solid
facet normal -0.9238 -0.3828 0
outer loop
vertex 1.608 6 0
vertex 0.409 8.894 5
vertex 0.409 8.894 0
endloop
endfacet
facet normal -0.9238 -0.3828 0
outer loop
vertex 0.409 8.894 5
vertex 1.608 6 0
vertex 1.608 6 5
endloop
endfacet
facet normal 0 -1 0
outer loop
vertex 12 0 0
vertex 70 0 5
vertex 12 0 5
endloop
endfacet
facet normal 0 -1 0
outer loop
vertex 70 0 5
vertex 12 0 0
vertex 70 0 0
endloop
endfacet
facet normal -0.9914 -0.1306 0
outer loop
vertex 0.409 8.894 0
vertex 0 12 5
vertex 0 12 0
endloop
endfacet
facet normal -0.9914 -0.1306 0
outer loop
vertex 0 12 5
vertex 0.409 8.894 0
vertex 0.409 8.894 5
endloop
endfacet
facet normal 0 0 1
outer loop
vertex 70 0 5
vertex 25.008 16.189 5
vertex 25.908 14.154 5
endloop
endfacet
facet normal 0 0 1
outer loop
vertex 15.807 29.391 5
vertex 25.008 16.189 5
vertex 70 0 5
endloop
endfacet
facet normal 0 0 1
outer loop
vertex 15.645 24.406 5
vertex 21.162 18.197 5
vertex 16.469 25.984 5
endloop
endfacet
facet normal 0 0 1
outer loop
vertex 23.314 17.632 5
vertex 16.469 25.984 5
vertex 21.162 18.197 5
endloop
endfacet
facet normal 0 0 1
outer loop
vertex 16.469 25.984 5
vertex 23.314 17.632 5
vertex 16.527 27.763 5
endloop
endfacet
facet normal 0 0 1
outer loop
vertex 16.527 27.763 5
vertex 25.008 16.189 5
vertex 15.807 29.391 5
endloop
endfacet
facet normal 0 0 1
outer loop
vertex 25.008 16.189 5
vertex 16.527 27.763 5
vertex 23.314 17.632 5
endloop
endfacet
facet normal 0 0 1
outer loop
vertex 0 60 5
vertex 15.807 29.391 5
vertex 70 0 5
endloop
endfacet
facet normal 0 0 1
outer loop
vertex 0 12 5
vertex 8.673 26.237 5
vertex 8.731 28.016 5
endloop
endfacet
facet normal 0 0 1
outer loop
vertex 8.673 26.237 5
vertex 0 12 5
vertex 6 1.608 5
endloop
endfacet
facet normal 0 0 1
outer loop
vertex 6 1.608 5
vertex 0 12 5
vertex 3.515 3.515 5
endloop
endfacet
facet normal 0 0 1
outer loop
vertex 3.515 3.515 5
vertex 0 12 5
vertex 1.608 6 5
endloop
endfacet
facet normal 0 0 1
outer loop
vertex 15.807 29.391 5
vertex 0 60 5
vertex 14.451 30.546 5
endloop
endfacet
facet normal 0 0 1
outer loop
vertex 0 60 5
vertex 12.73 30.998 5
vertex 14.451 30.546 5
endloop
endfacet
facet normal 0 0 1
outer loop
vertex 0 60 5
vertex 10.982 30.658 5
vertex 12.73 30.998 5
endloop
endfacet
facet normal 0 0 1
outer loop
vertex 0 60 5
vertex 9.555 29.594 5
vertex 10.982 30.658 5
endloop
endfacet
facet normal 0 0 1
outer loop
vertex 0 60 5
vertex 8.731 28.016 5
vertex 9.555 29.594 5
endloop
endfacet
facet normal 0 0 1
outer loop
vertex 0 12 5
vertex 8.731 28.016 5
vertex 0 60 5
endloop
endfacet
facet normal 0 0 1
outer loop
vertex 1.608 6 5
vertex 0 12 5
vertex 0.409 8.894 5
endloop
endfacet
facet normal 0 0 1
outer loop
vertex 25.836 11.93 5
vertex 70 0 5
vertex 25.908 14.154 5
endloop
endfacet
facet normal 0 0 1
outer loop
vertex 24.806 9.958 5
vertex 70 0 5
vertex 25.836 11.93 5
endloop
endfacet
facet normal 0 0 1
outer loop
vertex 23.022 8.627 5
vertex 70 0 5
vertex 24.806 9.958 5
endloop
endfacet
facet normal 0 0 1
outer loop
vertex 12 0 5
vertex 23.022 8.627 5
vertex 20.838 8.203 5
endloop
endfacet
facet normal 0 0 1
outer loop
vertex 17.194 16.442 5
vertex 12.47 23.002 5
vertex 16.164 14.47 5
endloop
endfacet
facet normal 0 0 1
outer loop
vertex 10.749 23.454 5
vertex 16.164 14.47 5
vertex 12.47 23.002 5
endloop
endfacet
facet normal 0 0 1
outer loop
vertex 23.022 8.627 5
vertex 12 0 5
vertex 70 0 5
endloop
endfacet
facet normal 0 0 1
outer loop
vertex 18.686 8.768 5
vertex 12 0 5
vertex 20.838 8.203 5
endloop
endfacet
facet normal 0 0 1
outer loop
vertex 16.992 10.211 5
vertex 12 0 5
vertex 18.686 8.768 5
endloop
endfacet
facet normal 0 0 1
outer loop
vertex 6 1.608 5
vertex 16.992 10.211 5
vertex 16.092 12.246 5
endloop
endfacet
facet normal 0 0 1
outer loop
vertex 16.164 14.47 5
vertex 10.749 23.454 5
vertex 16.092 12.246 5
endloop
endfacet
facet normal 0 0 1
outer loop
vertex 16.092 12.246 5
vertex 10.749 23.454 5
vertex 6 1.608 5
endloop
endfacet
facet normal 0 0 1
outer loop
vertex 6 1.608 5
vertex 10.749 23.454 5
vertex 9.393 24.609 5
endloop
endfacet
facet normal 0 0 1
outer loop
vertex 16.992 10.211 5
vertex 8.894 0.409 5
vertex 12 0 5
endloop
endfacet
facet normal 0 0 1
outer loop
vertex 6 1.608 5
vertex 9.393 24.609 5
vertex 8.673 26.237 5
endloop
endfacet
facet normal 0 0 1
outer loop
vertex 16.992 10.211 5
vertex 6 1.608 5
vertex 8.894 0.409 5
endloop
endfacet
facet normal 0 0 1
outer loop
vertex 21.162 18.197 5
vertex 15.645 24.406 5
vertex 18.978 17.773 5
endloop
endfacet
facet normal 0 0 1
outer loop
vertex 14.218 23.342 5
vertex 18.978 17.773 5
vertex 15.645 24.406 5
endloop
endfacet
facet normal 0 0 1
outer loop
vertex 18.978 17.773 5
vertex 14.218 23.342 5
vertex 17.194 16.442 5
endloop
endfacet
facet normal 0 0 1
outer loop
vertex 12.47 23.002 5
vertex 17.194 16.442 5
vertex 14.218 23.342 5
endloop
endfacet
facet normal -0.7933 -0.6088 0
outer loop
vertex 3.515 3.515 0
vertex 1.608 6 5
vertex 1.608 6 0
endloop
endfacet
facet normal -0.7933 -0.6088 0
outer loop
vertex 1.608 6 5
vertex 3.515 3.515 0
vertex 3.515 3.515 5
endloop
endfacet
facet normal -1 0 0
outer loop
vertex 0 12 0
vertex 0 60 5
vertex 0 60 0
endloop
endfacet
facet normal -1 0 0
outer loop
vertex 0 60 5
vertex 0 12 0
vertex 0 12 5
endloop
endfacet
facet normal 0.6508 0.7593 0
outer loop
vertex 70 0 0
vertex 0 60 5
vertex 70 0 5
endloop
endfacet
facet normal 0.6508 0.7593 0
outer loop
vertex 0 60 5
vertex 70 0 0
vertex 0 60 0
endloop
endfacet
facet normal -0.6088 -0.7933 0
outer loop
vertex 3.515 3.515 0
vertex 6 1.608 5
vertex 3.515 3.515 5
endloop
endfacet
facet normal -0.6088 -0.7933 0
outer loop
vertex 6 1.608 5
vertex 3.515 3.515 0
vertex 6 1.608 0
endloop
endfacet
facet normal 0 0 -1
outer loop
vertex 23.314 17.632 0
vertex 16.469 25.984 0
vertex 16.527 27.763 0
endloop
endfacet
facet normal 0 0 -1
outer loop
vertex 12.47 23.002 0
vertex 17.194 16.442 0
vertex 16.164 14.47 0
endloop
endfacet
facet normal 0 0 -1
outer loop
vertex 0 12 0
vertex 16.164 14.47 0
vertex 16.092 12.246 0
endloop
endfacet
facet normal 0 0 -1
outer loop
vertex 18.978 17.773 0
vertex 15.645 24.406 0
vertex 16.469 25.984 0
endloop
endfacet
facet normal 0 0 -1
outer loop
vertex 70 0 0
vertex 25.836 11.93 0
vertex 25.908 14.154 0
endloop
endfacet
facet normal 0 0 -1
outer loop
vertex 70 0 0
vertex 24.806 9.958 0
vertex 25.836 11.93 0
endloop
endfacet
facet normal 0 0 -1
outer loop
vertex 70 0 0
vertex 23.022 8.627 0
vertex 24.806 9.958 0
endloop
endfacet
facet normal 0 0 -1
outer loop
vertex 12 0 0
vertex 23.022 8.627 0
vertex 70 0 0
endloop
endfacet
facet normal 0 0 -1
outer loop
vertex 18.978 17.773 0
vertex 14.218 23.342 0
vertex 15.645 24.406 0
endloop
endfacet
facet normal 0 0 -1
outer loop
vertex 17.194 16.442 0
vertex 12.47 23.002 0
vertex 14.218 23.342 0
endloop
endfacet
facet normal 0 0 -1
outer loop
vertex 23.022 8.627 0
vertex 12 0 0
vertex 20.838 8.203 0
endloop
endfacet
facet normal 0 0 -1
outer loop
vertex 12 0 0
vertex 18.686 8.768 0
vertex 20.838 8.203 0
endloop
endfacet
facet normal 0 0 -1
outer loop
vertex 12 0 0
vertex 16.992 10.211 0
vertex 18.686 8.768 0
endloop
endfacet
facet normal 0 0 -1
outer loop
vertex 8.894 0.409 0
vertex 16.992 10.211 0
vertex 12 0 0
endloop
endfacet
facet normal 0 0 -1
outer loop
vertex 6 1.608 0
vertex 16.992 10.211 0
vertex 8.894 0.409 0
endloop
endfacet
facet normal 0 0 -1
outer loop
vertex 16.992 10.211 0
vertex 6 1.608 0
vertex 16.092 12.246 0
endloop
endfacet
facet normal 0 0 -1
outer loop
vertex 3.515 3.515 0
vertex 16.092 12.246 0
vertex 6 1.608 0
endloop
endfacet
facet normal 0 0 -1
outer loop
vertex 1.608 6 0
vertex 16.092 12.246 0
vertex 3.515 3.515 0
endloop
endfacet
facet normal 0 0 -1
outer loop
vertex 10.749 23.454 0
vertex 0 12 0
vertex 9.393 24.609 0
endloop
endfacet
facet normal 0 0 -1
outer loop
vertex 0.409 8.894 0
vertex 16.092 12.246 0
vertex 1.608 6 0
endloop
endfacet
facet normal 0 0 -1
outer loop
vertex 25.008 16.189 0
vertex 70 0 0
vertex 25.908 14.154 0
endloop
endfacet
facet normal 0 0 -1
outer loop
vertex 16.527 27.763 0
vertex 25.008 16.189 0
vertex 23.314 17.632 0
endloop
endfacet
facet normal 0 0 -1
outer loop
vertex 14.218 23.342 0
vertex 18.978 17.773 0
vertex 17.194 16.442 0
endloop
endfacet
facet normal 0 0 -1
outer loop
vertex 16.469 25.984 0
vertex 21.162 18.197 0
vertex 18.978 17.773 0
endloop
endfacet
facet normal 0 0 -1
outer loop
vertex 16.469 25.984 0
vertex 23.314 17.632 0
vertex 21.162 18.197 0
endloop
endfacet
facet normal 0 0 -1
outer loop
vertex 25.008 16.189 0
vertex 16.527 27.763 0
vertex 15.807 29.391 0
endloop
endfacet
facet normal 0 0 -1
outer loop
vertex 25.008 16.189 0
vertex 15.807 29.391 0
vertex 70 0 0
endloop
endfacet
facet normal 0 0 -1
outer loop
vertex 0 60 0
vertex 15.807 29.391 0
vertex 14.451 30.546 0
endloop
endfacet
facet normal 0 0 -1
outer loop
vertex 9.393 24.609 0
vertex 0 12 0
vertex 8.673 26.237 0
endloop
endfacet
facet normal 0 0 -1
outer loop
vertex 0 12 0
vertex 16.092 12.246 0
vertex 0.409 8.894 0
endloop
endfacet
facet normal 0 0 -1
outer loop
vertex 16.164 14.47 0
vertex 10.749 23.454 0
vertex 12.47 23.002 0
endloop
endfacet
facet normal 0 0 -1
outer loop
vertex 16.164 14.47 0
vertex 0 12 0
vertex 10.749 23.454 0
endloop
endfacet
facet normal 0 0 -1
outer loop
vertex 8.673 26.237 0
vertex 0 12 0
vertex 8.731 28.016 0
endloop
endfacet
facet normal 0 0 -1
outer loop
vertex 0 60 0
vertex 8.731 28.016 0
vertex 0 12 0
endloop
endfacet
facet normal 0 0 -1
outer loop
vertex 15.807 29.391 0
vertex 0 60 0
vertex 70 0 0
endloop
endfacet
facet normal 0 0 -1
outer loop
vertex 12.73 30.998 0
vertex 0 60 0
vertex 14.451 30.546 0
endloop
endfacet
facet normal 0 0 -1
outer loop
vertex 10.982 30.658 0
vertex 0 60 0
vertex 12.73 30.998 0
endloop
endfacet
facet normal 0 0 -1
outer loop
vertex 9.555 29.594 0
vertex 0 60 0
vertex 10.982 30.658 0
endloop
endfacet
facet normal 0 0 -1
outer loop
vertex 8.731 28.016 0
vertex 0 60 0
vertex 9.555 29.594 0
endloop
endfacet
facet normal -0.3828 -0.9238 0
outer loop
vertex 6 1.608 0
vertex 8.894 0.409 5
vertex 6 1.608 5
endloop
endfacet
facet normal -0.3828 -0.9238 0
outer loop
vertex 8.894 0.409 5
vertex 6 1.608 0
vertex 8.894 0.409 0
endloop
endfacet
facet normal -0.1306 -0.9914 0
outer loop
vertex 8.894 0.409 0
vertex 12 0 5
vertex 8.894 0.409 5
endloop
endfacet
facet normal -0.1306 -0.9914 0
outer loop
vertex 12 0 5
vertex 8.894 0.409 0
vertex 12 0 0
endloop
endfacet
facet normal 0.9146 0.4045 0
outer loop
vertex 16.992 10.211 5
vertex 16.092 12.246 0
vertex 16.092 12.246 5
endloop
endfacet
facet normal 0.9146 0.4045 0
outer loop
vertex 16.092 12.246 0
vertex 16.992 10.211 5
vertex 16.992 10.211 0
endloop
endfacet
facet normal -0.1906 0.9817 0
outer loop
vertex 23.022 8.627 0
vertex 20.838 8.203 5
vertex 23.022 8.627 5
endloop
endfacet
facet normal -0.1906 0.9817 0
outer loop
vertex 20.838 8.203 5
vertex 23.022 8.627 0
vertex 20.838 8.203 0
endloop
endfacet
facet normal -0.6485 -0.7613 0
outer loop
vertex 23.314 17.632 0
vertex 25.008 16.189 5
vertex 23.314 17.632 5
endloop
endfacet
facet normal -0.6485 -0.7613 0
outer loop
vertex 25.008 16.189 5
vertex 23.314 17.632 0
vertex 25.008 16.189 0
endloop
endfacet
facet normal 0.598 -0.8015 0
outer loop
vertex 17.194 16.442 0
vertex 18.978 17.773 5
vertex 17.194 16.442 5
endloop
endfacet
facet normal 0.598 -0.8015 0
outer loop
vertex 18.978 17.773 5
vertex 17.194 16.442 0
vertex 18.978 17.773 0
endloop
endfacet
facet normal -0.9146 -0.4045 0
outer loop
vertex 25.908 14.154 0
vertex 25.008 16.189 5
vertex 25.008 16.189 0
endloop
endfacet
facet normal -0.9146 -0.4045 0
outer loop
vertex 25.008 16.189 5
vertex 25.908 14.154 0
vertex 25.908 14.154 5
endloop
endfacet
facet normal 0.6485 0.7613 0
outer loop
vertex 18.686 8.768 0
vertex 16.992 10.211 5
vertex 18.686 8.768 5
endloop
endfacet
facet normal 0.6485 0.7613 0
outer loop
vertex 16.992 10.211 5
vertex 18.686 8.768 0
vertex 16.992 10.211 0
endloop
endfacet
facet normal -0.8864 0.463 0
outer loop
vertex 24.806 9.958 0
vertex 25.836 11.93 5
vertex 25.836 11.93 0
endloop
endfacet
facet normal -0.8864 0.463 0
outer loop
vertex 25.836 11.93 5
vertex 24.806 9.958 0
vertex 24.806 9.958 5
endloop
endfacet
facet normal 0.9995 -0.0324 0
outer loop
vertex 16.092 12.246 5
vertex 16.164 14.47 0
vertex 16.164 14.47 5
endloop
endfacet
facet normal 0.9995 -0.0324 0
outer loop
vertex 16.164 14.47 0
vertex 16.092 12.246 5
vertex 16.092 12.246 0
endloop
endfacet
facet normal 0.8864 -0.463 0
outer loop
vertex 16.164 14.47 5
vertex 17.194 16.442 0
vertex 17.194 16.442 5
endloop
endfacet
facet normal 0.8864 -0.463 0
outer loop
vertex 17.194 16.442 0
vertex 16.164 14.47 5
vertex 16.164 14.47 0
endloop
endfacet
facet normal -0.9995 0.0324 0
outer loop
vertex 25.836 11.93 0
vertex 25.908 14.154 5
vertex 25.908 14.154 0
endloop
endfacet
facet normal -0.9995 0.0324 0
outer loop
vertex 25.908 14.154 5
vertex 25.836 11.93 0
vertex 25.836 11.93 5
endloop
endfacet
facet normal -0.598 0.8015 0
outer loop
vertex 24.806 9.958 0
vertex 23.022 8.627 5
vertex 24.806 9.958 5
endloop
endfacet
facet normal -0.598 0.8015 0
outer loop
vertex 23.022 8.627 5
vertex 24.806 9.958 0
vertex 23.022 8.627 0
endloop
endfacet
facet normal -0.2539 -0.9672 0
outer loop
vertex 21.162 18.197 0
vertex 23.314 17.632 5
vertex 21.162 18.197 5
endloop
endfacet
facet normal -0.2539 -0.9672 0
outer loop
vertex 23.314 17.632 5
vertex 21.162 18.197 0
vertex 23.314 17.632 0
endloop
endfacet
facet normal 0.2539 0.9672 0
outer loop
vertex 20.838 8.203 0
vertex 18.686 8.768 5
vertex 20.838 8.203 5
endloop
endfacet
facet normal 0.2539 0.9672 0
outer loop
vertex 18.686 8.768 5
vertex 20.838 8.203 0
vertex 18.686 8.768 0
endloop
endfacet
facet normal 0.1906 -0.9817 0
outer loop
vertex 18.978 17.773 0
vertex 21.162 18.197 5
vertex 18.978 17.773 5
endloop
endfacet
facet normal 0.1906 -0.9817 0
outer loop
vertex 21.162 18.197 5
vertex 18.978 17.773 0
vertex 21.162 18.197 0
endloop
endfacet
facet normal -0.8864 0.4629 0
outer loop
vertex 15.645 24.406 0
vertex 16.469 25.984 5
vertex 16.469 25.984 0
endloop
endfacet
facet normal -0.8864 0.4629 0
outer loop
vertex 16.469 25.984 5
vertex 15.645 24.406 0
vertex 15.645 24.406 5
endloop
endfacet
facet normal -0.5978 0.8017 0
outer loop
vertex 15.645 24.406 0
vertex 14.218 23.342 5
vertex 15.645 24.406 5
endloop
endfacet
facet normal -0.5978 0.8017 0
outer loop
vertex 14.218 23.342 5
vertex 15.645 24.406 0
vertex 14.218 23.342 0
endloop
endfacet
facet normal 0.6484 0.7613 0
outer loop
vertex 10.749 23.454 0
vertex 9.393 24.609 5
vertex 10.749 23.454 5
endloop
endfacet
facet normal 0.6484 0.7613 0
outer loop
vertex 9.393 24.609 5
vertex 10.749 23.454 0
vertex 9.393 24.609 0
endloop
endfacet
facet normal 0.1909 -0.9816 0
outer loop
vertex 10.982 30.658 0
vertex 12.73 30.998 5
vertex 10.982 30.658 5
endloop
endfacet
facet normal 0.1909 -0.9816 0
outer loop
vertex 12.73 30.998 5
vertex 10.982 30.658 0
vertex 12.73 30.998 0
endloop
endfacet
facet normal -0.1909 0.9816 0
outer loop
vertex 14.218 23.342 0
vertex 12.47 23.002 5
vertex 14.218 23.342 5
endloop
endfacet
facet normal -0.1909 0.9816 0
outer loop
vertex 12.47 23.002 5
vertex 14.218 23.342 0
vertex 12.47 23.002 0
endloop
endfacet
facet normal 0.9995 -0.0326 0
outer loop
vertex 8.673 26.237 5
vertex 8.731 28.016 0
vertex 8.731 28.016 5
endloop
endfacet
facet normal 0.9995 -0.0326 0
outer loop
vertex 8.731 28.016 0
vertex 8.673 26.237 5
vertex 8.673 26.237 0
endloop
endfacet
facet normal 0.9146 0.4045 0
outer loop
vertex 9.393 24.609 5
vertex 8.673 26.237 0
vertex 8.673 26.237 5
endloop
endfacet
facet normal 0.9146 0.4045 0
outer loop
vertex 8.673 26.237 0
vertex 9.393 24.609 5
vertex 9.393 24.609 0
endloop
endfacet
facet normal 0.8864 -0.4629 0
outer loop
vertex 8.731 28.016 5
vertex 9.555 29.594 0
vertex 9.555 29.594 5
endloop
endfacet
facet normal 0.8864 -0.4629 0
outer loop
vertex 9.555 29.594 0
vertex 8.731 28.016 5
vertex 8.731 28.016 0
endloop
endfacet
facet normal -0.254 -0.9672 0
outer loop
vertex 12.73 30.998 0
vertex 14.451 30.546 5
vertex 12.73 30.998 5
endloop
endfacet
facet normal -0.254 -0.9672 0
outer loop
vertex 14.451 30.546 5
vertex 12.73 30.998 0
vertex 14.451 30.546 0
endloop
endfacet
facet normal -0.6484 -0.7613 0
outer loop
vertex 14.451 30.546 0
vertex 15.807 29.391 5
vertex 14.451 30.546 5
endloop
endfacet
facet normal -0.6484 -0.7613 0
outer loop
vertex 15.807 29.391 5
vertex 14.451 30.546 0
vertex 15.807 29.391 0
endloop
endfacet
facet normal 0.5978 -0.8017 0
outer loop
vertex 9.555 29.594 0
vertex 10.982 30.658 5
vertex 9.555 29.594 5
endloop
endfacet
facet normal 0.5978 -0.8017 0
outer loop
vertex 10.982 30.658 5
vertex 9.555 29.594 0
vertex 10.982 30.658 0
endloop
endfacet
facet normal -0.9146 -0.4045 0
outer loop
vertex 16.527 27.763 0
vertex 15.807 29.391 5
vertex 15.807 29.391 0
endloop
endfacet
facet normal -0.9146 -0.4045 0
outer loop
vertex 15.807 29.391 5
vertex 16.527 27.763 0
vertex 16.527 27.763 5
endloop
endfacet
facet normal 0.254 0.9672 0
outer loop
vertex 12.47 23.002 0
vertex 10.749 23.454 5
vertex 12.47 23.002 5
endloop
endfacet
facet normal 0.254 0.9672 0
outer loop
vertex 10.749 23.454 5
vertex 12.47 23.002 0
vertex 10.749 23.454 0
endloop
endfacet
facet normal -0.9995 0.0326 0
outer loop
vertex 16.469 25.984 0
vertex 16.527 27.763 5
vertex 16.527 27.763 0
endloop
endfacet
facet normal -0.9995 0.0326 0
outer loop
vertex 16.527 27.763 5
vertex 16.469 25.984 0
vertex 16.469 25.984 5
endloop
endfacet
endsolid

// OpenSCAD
$fn = 32;

// ----------------------------------------------------------------------
// Bracket plate: corner pad 70 x 60, fillet R12
// ----------------------------------------------------------------------

// --- parameters (mm) ---
hole_r = 4;               // bolt hole radius
plate_t = 5;              // plate thickness, Z (extrusion height)
leg_a = 70;               // base leg
leg_b = 60;               // height leg
fillet_r = 12;            // right-angle fillet radius

hole_d1 = 2 * hole_r + 2;
hole_d2 = 2 * hole_r;

profile = [[12, 0], [70, 0], [0, 60], [0, 12], [0.409, 8.894], [1.608, 6], [3.515, 3.515], [6, 1.608], [8.894, 0.409]];  // primary outline, 9 points, counter clockwise
void_1 = [[25.908, 14.154], [25.008, 16.189], [23.314, 17.632], [21.162, 18.197], [18.978, 17.773], [17.194, 16.442], [16.164, 14.47], [16.092, 12.246], [16.992, 10.211], [18.686, 8.768], [20.838, 8.203], [23.022, 8.627], [24.806, 9.958], [25.836, 11.93]];  // mount hole 1, 14 points
void_2 = [[16.527, 27.763], [15.807, 29.391], [14.451, 30.546], [12.73, 30.998], [10.982, 30.658], [9.555, 29.594], [8.731, 28.016], [8.673, 26.237], [9.393, 24.609], [10.749, 23.454], [12.47, 23.002], [14.218, 23.342], [15.645, 24.406], [16.469, 25.984]];  // mount hole 2, 14 points

// --- the one profile operation ---
difference() {
  linear_extrude(height = plate_t) polygon(points = profile);
  translate([0, 0, -1])
    linear_extrude(height = plate_t + 2) polygon(points = void_1);
  translate([0, 0, -1])
    linear_extrude(height = plate_t + 2) polygon(points = void_2);
}
